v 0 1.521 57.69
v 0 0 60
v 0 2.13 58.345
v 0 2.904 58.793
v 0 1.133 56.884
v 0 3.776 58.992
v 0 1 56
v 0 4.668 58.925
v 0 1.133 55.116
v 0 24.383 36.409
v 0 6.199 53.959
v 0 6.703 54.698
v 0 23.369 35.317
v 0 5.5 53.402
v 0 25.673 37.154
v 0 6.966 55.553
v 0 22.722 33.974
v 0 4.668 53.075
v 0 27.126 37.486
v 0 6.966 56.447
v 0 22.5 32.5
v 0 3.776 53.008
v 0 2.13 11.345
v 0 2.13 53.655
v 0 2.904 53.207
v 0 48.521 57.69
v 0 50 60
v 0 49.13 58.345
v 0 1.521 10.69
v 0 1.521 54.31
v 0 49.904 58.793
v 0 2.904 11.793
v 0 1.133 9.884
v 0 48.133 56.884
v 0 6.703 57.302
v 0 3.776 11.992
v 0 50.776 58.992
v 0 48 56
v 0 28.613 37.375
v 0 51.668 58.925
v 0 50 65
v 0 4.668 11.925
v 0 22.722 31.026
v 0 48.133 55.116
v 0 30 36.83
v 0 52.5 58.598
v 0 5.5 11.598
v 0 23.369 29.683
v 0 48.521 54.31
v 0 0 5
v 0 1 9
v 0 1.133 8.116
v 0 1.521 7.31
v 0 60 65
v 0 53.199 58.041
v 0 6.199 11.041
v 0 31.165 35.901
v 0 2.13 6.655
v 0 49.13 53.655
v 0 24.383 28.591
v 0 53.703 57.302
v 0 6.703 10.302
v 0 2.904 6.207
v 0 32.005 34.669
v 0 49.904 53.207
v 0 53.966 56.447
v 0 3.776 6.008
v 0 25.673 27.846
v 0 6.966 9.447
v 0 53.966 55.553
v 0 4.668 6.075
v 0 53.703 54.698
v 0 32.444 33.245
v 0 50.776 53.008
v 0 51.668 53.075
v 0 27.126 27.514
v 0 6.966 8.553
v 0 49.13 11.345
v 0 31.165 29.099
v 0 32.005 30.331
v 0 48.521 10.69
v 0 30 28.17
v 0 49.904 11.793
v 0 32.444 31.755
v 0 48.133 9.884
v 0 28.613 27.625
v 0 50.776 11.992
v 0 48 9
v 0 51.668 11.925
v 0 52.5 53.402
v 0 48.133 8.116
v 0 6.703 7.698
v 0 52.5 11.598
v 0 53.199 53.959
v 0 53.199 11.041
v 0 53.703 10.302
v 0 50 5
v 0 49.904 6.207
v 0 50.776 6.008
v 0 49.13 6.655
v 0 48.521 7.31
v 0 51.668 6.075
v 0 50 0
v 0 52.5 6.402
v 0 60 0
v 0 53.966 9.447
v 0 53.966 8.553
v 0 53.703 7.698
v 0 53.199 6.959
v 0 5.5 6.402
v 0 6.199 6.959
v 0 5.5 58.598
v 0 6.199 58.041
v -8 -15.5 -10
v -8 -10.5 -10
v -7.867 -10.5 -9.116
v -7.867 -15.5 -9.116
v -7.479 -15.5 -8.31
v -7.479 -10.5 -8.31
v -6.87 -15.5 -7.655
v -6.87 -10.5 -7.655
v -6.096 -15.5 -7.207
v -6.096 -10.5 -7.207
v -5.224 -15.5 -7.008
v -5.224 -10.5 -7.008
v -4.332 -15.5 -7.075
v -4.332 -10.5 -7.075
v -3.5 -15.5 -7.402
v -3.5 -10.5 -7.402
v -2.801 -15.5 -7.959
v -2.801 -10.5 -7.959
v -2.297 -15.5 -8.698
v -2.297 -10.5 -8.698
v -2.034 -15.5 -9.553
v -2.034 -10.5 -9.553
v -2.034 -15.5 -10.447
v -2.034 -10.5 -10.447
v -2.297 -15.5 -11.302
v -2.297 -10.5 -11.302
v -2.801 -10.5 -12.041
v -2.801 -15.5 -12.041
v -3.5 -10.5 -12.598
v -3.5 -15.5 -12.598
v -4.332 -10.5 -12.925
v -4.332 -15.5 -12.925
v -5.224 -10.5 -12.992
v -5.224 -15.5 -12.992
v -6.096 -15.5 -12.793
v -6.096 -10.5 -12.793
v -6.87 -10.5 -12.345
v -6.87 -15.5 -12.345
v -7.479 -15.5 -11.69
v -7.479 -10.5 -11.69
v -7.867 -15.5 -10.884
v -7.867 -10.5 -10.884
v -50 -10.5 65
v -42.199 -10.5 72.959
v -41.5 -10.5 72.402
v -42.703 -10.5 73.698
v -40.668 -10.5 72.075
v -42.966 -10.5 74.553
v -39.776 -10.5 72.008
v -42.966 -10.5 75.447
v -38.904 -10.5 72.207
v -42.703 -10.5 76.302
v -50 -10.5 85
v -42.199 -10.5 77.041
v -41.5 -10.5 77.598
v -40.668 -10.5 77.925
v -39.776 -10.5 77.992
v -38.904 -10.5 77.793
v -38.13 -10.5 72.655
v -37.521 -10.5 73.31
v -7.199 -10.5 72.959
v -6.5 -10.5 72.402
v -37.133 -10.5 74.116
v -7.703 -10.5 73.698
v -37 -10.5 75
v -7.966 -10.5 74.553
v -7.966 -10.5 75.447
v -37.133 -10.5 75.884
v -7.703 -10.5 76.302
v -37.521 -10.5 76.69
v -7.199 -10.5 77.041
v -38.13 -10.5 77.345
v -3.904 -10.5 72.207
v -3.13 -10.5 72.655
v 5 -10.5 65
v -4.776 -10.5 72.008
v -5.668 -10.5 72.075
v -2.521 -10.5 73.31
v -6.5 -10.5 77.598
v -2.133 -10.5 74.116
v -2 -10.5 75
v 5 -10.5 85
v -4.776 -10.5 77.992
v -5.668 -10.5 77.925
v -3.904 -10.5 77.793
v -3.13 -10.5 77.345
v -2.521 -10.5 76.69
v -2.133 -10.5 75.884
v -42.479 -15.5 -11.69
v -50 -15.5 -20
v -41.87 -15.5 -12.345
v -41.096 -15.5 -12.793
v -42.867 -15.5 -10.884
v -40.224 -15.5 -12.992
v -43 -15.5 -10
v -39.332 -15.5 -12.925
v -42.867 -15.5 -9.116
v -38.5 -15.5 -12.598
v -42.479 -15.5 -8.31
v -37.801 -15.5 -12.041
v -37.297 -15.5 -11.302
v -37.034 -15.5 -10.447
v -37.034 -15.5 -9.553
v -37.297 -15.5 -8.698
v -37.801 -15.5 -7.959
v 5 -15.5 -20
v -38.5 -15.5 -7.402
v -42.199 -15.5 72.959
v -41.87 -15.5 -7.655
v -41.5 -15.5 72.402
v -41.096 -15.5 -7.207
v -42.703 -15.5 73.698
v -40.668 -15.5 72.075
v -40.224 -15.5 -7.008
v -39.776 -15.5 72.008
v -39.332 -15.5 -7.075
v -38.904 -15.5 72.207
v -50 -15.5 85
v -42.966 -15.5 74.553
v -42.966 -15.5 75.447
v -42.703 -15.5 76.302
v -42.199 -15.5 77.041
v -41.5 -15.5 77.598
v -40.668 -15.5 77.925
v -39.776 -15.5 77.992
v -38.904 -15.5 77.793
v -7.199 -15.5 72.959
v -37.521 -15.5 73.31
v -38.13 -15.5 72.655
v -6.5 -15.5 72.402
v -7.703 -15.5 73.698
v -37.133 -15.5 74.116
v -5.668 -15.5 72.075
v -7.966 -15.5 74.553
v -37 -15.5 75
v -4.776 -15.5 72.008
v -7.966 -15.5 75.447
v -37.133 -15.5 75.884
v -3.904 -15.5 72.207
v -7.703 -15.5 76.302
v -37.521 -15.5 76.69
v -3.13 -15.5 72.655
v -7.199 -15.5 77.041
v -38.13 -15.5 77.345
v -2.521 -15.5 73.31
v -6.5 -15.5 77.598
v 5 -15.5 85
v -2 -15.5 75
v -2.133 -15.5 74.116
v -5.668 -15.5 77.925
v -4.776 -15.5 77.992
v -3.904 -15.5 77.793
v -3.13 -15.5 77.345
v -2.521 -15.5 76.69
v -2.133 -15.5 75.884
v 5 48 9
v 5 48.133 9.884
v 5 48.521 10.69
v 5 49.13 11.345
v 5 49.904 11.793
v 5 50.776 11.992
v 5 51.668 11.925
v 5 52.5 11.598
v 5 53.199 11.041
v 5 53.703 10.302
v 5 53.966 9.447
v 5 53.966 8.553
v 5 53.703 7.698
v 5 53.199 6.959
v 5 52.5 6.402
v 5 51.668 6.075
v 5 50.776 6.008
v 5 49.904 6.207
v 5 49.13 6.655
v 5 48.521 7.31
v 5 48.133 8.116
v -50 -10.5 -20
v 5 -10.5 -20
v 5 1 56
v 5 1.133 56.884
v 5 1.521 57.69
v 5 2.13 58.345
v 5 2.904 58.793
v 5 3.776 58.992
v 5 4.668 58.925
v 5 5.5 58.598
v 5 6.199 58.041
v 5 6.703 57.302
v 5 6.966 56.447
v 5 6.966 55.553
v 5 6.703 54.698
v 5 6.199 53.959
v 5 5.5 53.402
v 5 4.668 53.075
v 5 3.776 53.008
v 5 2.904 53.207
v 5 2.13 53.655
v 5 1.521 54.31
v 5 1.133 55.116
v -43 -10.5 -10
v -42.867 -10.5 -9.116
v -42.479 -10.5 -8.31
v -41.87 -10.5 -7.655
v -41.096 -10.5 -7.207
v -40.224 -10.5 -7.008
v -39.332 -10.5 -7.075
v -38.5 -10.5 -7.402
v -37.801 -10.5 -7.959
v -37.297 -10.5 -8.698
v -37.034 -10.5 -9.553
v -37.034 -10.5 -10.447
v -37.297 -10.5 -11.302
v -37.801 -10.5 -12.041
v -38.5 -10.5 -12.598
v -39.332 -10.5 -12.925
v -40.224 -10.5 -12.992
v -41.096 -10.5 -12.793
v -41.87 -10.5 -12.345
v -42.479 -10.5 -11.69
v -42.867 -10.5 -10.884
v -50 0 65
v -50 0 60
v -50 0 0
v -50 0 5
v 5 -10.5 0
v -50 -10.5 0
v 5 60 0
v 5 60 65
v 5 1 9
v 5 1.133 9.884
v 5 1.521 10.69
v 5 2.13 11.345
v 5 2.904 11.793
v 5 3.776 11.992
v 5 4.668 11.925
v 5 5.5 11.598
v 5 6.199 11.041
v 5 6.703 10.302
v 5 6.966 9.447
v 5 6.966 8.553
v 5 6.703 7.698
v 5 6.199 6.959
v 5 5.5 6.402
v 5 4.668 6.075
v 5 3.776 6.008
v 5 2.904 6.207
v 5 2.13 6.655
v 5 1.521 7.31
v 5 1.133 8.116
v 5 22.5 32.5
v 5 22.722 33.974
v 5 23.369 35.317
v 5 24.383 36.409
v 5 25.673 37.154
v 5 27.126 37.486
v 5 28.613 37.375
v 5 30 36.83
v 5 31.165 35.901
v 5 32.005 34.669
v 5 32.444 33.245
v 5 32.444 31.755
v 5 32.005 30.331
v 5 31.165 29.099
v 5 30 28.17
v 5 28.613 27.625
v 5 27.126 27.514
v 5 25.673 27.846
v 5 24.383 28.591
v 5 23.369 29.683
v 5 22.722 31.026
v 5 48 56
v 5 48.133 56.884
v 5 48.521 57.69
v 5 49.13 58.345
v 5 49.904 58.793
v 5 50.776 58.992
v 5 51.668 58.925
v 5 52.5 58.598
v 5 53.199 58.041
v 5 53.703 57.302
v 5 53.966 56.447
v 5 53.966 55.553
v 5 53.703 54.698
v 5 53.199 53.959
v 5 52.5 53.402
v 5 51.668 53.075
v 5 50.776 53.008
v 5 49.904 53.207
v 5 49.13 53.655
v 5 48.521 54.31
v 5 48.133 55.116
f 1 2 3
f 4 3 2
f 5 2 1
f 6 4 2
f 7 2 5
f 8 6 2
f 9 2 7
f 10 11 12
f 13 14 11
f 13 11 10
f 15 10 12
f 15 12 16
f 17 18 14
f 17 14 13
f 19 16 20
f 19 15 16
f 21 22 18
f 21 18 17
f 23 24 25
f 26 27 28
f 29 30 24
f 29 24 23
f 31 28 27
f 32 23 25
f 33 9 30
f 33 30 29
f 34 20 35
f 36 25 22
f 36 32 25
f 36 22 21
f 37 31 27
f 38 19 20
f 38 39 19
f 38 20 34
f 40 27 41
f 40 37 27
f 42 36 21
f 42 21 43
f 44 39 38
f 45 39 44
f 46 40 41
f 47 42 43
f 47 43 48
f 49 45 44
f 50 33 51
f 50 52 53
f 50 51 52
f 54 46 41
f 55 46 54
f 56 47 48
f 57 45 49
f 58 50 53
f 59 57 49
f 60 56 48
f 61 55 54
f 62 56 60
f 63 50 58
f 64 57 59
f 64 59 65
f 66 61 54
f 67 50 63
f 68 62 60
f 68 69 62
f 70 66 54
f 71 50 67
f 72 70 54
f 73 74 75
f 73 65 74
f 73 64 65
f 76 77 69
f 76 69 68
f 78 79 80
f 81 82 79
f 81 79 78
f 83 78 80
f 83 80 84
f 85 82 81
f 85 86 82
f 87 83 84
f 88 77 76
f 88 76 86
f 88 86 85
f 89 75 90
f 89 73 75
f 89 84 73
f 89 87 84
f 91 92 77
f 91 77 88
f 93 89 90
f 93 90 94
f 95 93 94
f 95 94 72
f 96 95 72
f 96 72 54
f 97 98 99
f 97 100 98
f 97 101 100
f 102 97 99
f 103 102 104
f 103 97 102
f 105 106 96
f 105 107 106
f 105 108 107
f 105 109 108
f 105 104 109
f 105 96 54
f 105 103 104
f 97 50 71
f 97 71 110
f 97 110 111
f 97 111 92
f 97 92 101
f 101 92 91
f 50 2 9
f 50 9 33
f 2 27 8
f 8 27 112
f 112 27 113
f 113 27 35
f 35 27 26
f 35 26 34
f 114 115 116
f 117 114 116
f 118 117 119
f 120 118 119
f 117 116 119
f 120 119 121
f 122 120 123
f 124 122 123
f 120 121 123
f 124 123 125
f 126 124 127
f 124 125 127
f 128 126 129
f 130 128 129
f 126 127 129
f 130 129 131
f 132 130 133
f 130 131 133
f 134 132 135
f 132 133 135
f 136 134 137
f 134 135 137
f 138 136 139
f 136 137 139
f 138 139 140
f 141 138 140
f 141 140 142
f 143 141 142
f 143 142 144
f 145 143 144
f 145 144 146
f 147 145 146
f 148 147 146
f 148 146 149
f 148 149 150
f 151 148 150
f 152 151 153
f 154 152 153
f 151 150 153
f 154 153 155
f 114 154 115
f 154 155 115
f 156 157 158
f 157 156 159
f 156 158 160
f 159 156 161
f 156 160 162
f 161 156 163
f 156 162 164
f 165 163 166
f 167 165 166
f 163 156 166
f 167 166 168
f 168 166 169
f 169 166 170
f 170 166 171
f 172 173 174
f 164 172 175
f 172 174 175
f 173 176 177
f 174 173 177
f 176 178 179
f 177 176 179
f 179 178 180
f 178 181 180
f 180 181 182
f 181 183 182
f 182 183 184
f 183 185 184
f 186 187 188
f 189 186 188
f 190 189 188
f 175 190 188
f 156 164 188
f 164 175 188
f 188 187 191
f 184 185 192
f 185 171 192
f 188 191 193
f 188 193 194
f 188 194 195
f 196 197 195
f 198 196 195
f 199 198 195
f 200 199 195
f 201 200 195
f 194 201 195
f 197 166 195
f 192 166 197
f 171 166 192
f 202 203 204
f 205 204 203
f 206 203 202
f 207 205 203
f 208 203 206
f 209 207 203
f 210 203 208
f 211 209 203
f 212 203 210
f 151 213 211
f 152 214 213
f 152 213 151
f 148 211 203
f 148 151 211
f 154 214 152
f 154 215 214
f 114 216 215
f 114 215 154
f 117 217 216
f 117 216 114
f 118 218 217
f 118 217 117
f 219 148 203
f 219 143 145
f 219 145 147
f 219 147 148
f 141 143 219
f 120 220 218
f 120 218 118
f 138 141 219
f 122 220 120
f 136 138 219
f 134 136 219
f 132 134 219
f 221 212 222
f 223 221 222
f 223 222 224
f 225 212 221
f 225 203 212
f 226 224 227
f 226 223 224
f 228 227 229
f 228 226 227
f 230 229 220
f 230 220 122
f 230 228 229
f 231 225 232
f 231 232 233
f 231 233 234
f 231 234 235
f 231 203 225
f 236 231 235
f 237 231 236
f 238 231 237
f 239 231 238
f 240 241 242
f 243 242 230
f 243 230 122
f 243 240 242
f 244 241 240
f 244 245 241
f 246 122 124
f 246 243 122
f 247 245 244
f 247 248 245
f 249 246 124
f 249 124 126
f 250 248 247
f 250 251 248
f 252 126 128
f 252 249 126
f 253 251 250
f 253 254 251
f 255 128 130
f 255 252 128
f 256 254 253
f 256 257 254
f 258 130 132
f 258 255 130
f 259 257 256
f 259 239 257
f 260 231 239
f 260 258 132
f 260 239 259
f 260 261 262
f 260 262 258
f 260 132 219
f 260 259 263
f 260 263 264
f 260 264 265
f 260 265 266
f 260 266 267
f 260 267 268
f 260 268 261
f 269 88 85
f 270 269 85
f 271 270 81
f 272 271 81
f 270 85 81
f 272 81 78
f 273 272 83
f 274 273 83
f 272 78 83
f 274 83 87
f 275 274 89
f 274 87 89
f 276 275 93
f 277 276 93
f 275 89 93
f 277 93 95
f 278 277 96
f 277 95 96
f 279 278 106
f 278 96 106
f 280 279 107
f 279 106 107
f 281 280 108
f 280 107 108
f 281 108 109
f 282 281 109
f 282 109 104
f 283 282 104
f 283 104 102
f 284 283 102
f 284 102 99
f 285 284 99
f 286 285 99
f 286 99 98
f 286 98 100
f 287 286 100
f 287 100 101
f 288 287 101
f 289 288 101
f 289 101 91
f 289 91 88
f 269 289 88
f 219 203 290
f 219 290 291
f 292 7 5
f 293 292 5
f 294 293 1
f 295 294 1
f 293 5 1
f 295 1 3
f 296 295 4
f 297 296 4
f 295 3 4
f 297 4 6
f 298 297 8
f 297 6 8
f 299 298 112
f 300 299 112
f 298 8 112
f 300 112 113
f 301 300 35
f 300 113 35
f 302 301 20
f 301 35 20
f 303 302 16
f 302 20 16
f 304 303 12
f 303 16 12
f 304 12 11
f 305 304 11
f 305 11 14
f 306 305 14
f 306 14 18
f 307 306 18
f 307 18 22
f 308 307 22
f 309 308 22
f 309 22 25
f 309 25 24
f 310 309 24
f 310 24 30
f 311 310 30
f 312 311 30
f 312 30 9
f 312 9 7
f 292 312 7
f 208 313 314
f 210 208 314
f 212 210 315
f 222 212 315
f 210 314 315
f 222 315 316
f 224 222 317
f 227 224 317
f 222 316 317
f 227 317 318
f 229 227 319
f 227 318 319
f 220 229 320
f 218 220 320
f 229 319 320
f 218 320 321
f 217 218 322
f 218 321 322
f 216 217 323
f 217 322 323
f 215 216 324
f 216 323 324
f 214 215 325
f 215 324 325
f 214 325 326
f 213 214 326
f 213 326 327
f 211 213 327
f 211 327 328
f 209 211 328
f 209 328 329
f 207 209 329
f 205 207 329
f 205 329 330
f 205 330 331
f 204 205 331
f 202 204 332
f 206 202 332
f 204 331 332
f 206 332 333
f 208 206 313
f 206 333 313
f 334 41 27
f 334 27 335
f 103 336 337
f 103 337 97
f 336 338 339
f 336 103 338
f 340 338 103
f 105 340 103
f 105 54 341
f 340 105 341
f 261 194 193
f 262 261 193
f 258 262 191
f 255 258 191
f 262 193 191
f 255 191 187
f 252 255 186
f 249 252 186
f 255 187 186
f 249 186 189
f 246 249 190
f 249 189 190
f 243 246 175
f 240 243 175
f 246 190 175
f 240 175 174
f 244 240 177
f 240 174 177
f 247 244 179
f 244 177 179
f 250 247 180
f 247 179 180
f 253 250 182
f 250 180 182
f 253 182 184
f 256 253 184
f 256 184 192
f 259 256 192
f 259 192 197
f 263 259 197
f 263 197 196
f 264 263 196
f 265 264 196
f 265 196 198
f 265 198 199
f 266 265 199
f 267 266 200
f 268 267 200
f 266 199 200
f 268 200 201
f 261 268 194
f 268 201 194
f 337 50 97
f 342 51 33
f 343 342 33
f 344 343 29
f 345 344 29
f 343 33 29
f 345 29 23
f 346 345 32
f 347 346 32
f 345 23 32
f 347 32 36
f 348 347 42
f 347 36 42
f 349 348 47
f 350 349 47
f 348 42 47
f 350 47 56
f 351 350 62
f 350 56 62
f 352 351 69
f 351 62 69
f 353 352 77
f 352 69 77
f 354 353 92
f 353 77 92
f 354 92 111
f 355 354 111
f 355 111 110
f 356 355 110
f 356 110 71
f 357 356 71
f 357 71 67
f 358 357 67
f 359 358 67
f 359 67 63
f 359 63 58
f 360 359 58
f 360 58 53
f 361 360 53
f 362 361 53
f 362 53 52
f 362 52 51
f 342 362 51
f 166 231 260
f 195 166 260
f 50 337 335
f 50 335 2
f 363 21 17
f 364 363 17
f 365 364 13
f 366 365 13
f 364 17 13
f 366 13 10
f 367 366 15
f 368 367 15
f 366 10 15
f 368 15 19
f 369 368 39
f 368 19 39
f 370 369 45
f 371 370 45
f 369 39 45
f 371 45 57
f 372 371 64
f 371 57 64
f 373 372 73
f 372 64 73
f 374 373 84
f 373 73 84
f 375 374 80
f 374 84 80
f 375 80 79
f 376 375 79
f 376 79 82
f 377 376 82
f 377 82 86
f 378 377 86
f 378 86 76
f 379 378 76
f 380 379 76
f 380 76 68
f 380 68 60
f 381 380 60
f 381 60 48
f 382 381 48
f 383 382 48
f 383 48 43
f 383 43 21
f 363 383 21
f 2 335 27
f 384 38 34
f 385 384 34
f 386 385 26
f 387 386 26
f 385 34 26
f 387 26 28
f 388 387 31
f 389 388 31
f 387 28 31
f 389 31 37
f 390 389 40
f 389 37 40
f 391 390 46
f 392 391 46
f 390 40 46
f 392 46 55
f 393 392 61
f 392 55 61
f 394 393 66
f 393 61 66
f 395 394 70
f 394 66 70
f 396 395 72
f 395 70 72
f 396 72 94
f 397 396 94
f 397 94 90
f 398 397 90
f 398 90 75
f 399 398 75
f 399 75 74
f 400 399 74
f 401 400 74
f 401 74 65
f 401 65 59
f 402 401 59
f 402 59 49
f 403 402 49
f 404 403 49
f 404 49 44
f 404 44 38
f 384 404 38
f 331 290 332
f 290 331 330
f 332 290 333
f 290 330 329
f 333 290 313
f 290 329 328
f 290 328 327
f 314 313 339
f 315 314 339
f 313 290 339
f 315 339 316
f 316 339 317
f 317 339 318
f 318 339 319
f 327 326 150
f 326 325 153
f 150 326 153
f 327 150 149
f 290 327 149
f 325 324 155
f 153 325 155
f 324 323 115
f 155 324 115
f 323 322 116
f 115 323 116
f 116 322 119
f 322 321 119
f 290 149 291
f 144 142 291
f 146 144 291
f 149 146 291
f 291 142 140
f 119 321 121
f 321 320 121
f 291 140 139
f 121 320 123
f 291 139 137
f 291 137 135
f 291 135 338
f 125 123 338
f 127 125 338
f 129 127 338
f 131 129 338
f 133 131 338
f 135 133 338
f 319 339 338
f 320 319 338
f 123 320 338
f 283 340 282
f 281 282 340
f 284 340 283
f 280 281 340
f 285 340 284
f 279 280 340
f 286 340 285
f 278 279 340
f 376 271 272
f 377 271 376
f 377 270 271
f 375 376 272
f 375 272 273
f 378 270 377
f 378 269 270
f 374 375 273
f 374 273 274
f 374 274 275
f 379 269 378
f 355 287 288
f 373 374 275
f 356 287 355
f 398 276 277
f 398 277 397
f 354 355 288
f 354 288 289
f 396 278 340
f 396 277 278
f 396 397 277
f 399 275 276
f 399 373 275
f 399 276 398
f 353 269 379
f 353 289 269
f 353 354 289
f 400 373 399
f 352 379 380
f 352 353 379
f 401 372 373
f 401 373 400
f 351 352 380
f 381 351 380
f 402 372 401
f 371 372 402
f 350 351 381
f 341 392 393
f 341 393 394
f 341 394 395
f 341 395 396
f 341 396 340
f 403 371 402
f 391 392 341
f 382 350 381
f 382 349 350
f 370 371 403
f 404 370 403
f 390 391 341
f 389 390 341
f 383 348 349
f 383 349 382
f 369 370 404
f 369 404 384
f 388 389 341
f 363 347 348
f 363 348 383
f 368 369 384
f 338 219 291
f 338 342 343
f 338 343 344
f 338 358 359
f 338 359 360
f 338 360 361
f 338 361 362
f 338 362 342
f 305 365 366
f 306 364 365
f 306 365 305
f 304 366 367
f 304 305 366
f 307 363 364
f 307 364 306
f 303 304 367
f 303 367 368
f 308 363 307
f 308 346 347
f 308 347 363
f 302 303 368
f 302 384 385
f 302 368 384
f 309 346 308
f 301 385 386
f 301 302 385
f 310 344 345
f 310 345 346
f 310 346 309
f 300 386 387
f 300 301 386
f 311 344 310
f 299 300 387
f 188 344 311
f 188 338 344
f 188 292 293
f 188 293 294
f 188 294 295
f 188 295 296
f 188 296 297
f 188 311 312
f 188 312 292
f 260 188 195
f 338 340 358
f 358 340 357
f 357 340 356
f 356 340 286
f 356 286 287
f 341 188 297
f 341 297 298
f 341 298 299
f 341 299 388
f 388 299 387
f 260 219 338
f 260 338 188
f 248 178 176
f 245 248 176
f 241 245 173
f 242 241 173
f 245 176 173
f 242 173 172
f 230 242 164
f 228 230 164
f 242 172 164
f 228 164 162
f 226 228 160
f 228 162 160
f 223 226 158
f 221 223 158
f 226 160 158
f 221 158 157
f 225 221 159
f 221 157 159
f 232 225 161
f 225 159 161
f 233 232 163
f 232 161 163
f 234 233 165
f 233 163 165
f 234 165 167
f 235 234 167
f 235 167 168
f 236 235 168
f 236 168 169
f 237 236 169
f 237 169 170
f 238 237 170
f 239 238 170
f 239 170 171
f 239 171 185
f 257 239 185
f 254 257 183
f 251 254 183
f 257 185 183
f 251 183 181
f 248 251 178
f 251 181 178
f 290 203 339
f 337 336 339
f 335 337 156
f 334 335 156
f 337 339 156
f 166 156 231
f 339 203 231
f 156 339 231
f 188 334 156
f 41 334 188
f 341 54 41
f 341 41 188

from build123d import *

# Parameters (mm, degrees)
BOSS_EXTRUDE1_DEPTH = 65
BOSS_EXTRUDE2_DEPTH = 5
BOSS_EXTRUDE3_DEPTH = 5
SKETCH4_R           = 5
SKETCH4_R_2         = 3
CUT_EXTRUDE1_DEPTH  = 102.612007165
SKETCH5_W           = 55
SKETCH5_H           = 20
BOSS_EXTRUDE4_DEPTH = 5
SKETCH6_R           = 3
CUT_EXTRUDE2_DEPTH  = 5


with BuildPart() as part:
    # Sketch1 → Boss-Extrude1 (new body)
    with BuildSketch(Plane.XY):
        Polygon((0, 0), (0, 60), (5, 60), (5, -15.5), (-50, -15.5), (-50, 0), align=None)
    extrude(amount=BOSS_EXTRUDE1_DEPTH)

    # Sketch2 → Boss-Extrude2 (add)
    with BuildSketch(Plane(origin=(0, 0, 0), x_dir=(-1, 0, 0), z_dir=(0, 0, -1))):
        Polygon((0, 0), (50, 0), (0, 50), align=None)
    extrude(amount=-BOSS_EXTRUDE2_DEPTH)

    # Sketch3 → Boss-Extrude3 (add)
    with BuildSketch(Plane.XY.offset(65)):
        Polygon((-50, 0), (0, 0), (0, 50), align=None)
    extrude(amount=-BOSS_EXTRUDE3_DEPTH)

    # Sketch4 → Cut-Extrude1 (cut, through all)
    with BuildSketch(Plane.ZY):
        with Locations(Location((32.5, 27.5, 0), (0, 0, 270))):
            Circle(SKETCH4_R)
        with Locations(Location((9, 51, 0), (0, 0, 270))):
            Circle(SKETCH4_R_2)
        with Locations(Location((56, 51, 0), (0, 0, 270))):
            Circle(SKETCH4_R_2)
        with Locations(Location((56, 4, 0), (0, 0, 270))):
            Circle(SKETCH4_R_2)
        with Locations(Location((9, 4, 0), (0, 0, 270))):
            Circle(SKETCH4_R_2)
    extrude(amount=-CUT_EXTRUDE1_DEPTH, mode=Mode.SUBTRACT)

    # Sketch5 → Boss-Extrude4 (add)
    with BuildSketch(Plane.XZ.offset(15.5)):
        with Locations((-22.5, -10)):
            Rectangle(SKETCH5_W, SKETCH5_H)
        with Locations((-22.5, 75)):
            Rectangle(SKETCH5_W, SKETCH5_H)
    extrude(amount=-BOSS_EXTRUDE4_DEPTH)

    # Sketch6 → Cut-Extrude2 (cut)
    with BuildSketch(Plane(origin=(0, -10.5, 0), x_dir=(1, 0, 0), z_dir=(0, 1, 0))):
        with Locations(Location((-5, 10, 0), (0, 0, 180))):
            Circle(SKETCH6_R)
        with Locations(Location((-40, 10, 0), (0, 0, 180))):
            Circle(SKETCH6_R)
        with Locations((-5, -75)):
            Circle(SKETCH6_R)
        with Locations((-40, -75)):
            Circle(SKETCH6_R)
    extrude(amount=-CUT_EXTRUDE2_DEPTH, mode=Mode.SUBTRACT)


solid = part.part
